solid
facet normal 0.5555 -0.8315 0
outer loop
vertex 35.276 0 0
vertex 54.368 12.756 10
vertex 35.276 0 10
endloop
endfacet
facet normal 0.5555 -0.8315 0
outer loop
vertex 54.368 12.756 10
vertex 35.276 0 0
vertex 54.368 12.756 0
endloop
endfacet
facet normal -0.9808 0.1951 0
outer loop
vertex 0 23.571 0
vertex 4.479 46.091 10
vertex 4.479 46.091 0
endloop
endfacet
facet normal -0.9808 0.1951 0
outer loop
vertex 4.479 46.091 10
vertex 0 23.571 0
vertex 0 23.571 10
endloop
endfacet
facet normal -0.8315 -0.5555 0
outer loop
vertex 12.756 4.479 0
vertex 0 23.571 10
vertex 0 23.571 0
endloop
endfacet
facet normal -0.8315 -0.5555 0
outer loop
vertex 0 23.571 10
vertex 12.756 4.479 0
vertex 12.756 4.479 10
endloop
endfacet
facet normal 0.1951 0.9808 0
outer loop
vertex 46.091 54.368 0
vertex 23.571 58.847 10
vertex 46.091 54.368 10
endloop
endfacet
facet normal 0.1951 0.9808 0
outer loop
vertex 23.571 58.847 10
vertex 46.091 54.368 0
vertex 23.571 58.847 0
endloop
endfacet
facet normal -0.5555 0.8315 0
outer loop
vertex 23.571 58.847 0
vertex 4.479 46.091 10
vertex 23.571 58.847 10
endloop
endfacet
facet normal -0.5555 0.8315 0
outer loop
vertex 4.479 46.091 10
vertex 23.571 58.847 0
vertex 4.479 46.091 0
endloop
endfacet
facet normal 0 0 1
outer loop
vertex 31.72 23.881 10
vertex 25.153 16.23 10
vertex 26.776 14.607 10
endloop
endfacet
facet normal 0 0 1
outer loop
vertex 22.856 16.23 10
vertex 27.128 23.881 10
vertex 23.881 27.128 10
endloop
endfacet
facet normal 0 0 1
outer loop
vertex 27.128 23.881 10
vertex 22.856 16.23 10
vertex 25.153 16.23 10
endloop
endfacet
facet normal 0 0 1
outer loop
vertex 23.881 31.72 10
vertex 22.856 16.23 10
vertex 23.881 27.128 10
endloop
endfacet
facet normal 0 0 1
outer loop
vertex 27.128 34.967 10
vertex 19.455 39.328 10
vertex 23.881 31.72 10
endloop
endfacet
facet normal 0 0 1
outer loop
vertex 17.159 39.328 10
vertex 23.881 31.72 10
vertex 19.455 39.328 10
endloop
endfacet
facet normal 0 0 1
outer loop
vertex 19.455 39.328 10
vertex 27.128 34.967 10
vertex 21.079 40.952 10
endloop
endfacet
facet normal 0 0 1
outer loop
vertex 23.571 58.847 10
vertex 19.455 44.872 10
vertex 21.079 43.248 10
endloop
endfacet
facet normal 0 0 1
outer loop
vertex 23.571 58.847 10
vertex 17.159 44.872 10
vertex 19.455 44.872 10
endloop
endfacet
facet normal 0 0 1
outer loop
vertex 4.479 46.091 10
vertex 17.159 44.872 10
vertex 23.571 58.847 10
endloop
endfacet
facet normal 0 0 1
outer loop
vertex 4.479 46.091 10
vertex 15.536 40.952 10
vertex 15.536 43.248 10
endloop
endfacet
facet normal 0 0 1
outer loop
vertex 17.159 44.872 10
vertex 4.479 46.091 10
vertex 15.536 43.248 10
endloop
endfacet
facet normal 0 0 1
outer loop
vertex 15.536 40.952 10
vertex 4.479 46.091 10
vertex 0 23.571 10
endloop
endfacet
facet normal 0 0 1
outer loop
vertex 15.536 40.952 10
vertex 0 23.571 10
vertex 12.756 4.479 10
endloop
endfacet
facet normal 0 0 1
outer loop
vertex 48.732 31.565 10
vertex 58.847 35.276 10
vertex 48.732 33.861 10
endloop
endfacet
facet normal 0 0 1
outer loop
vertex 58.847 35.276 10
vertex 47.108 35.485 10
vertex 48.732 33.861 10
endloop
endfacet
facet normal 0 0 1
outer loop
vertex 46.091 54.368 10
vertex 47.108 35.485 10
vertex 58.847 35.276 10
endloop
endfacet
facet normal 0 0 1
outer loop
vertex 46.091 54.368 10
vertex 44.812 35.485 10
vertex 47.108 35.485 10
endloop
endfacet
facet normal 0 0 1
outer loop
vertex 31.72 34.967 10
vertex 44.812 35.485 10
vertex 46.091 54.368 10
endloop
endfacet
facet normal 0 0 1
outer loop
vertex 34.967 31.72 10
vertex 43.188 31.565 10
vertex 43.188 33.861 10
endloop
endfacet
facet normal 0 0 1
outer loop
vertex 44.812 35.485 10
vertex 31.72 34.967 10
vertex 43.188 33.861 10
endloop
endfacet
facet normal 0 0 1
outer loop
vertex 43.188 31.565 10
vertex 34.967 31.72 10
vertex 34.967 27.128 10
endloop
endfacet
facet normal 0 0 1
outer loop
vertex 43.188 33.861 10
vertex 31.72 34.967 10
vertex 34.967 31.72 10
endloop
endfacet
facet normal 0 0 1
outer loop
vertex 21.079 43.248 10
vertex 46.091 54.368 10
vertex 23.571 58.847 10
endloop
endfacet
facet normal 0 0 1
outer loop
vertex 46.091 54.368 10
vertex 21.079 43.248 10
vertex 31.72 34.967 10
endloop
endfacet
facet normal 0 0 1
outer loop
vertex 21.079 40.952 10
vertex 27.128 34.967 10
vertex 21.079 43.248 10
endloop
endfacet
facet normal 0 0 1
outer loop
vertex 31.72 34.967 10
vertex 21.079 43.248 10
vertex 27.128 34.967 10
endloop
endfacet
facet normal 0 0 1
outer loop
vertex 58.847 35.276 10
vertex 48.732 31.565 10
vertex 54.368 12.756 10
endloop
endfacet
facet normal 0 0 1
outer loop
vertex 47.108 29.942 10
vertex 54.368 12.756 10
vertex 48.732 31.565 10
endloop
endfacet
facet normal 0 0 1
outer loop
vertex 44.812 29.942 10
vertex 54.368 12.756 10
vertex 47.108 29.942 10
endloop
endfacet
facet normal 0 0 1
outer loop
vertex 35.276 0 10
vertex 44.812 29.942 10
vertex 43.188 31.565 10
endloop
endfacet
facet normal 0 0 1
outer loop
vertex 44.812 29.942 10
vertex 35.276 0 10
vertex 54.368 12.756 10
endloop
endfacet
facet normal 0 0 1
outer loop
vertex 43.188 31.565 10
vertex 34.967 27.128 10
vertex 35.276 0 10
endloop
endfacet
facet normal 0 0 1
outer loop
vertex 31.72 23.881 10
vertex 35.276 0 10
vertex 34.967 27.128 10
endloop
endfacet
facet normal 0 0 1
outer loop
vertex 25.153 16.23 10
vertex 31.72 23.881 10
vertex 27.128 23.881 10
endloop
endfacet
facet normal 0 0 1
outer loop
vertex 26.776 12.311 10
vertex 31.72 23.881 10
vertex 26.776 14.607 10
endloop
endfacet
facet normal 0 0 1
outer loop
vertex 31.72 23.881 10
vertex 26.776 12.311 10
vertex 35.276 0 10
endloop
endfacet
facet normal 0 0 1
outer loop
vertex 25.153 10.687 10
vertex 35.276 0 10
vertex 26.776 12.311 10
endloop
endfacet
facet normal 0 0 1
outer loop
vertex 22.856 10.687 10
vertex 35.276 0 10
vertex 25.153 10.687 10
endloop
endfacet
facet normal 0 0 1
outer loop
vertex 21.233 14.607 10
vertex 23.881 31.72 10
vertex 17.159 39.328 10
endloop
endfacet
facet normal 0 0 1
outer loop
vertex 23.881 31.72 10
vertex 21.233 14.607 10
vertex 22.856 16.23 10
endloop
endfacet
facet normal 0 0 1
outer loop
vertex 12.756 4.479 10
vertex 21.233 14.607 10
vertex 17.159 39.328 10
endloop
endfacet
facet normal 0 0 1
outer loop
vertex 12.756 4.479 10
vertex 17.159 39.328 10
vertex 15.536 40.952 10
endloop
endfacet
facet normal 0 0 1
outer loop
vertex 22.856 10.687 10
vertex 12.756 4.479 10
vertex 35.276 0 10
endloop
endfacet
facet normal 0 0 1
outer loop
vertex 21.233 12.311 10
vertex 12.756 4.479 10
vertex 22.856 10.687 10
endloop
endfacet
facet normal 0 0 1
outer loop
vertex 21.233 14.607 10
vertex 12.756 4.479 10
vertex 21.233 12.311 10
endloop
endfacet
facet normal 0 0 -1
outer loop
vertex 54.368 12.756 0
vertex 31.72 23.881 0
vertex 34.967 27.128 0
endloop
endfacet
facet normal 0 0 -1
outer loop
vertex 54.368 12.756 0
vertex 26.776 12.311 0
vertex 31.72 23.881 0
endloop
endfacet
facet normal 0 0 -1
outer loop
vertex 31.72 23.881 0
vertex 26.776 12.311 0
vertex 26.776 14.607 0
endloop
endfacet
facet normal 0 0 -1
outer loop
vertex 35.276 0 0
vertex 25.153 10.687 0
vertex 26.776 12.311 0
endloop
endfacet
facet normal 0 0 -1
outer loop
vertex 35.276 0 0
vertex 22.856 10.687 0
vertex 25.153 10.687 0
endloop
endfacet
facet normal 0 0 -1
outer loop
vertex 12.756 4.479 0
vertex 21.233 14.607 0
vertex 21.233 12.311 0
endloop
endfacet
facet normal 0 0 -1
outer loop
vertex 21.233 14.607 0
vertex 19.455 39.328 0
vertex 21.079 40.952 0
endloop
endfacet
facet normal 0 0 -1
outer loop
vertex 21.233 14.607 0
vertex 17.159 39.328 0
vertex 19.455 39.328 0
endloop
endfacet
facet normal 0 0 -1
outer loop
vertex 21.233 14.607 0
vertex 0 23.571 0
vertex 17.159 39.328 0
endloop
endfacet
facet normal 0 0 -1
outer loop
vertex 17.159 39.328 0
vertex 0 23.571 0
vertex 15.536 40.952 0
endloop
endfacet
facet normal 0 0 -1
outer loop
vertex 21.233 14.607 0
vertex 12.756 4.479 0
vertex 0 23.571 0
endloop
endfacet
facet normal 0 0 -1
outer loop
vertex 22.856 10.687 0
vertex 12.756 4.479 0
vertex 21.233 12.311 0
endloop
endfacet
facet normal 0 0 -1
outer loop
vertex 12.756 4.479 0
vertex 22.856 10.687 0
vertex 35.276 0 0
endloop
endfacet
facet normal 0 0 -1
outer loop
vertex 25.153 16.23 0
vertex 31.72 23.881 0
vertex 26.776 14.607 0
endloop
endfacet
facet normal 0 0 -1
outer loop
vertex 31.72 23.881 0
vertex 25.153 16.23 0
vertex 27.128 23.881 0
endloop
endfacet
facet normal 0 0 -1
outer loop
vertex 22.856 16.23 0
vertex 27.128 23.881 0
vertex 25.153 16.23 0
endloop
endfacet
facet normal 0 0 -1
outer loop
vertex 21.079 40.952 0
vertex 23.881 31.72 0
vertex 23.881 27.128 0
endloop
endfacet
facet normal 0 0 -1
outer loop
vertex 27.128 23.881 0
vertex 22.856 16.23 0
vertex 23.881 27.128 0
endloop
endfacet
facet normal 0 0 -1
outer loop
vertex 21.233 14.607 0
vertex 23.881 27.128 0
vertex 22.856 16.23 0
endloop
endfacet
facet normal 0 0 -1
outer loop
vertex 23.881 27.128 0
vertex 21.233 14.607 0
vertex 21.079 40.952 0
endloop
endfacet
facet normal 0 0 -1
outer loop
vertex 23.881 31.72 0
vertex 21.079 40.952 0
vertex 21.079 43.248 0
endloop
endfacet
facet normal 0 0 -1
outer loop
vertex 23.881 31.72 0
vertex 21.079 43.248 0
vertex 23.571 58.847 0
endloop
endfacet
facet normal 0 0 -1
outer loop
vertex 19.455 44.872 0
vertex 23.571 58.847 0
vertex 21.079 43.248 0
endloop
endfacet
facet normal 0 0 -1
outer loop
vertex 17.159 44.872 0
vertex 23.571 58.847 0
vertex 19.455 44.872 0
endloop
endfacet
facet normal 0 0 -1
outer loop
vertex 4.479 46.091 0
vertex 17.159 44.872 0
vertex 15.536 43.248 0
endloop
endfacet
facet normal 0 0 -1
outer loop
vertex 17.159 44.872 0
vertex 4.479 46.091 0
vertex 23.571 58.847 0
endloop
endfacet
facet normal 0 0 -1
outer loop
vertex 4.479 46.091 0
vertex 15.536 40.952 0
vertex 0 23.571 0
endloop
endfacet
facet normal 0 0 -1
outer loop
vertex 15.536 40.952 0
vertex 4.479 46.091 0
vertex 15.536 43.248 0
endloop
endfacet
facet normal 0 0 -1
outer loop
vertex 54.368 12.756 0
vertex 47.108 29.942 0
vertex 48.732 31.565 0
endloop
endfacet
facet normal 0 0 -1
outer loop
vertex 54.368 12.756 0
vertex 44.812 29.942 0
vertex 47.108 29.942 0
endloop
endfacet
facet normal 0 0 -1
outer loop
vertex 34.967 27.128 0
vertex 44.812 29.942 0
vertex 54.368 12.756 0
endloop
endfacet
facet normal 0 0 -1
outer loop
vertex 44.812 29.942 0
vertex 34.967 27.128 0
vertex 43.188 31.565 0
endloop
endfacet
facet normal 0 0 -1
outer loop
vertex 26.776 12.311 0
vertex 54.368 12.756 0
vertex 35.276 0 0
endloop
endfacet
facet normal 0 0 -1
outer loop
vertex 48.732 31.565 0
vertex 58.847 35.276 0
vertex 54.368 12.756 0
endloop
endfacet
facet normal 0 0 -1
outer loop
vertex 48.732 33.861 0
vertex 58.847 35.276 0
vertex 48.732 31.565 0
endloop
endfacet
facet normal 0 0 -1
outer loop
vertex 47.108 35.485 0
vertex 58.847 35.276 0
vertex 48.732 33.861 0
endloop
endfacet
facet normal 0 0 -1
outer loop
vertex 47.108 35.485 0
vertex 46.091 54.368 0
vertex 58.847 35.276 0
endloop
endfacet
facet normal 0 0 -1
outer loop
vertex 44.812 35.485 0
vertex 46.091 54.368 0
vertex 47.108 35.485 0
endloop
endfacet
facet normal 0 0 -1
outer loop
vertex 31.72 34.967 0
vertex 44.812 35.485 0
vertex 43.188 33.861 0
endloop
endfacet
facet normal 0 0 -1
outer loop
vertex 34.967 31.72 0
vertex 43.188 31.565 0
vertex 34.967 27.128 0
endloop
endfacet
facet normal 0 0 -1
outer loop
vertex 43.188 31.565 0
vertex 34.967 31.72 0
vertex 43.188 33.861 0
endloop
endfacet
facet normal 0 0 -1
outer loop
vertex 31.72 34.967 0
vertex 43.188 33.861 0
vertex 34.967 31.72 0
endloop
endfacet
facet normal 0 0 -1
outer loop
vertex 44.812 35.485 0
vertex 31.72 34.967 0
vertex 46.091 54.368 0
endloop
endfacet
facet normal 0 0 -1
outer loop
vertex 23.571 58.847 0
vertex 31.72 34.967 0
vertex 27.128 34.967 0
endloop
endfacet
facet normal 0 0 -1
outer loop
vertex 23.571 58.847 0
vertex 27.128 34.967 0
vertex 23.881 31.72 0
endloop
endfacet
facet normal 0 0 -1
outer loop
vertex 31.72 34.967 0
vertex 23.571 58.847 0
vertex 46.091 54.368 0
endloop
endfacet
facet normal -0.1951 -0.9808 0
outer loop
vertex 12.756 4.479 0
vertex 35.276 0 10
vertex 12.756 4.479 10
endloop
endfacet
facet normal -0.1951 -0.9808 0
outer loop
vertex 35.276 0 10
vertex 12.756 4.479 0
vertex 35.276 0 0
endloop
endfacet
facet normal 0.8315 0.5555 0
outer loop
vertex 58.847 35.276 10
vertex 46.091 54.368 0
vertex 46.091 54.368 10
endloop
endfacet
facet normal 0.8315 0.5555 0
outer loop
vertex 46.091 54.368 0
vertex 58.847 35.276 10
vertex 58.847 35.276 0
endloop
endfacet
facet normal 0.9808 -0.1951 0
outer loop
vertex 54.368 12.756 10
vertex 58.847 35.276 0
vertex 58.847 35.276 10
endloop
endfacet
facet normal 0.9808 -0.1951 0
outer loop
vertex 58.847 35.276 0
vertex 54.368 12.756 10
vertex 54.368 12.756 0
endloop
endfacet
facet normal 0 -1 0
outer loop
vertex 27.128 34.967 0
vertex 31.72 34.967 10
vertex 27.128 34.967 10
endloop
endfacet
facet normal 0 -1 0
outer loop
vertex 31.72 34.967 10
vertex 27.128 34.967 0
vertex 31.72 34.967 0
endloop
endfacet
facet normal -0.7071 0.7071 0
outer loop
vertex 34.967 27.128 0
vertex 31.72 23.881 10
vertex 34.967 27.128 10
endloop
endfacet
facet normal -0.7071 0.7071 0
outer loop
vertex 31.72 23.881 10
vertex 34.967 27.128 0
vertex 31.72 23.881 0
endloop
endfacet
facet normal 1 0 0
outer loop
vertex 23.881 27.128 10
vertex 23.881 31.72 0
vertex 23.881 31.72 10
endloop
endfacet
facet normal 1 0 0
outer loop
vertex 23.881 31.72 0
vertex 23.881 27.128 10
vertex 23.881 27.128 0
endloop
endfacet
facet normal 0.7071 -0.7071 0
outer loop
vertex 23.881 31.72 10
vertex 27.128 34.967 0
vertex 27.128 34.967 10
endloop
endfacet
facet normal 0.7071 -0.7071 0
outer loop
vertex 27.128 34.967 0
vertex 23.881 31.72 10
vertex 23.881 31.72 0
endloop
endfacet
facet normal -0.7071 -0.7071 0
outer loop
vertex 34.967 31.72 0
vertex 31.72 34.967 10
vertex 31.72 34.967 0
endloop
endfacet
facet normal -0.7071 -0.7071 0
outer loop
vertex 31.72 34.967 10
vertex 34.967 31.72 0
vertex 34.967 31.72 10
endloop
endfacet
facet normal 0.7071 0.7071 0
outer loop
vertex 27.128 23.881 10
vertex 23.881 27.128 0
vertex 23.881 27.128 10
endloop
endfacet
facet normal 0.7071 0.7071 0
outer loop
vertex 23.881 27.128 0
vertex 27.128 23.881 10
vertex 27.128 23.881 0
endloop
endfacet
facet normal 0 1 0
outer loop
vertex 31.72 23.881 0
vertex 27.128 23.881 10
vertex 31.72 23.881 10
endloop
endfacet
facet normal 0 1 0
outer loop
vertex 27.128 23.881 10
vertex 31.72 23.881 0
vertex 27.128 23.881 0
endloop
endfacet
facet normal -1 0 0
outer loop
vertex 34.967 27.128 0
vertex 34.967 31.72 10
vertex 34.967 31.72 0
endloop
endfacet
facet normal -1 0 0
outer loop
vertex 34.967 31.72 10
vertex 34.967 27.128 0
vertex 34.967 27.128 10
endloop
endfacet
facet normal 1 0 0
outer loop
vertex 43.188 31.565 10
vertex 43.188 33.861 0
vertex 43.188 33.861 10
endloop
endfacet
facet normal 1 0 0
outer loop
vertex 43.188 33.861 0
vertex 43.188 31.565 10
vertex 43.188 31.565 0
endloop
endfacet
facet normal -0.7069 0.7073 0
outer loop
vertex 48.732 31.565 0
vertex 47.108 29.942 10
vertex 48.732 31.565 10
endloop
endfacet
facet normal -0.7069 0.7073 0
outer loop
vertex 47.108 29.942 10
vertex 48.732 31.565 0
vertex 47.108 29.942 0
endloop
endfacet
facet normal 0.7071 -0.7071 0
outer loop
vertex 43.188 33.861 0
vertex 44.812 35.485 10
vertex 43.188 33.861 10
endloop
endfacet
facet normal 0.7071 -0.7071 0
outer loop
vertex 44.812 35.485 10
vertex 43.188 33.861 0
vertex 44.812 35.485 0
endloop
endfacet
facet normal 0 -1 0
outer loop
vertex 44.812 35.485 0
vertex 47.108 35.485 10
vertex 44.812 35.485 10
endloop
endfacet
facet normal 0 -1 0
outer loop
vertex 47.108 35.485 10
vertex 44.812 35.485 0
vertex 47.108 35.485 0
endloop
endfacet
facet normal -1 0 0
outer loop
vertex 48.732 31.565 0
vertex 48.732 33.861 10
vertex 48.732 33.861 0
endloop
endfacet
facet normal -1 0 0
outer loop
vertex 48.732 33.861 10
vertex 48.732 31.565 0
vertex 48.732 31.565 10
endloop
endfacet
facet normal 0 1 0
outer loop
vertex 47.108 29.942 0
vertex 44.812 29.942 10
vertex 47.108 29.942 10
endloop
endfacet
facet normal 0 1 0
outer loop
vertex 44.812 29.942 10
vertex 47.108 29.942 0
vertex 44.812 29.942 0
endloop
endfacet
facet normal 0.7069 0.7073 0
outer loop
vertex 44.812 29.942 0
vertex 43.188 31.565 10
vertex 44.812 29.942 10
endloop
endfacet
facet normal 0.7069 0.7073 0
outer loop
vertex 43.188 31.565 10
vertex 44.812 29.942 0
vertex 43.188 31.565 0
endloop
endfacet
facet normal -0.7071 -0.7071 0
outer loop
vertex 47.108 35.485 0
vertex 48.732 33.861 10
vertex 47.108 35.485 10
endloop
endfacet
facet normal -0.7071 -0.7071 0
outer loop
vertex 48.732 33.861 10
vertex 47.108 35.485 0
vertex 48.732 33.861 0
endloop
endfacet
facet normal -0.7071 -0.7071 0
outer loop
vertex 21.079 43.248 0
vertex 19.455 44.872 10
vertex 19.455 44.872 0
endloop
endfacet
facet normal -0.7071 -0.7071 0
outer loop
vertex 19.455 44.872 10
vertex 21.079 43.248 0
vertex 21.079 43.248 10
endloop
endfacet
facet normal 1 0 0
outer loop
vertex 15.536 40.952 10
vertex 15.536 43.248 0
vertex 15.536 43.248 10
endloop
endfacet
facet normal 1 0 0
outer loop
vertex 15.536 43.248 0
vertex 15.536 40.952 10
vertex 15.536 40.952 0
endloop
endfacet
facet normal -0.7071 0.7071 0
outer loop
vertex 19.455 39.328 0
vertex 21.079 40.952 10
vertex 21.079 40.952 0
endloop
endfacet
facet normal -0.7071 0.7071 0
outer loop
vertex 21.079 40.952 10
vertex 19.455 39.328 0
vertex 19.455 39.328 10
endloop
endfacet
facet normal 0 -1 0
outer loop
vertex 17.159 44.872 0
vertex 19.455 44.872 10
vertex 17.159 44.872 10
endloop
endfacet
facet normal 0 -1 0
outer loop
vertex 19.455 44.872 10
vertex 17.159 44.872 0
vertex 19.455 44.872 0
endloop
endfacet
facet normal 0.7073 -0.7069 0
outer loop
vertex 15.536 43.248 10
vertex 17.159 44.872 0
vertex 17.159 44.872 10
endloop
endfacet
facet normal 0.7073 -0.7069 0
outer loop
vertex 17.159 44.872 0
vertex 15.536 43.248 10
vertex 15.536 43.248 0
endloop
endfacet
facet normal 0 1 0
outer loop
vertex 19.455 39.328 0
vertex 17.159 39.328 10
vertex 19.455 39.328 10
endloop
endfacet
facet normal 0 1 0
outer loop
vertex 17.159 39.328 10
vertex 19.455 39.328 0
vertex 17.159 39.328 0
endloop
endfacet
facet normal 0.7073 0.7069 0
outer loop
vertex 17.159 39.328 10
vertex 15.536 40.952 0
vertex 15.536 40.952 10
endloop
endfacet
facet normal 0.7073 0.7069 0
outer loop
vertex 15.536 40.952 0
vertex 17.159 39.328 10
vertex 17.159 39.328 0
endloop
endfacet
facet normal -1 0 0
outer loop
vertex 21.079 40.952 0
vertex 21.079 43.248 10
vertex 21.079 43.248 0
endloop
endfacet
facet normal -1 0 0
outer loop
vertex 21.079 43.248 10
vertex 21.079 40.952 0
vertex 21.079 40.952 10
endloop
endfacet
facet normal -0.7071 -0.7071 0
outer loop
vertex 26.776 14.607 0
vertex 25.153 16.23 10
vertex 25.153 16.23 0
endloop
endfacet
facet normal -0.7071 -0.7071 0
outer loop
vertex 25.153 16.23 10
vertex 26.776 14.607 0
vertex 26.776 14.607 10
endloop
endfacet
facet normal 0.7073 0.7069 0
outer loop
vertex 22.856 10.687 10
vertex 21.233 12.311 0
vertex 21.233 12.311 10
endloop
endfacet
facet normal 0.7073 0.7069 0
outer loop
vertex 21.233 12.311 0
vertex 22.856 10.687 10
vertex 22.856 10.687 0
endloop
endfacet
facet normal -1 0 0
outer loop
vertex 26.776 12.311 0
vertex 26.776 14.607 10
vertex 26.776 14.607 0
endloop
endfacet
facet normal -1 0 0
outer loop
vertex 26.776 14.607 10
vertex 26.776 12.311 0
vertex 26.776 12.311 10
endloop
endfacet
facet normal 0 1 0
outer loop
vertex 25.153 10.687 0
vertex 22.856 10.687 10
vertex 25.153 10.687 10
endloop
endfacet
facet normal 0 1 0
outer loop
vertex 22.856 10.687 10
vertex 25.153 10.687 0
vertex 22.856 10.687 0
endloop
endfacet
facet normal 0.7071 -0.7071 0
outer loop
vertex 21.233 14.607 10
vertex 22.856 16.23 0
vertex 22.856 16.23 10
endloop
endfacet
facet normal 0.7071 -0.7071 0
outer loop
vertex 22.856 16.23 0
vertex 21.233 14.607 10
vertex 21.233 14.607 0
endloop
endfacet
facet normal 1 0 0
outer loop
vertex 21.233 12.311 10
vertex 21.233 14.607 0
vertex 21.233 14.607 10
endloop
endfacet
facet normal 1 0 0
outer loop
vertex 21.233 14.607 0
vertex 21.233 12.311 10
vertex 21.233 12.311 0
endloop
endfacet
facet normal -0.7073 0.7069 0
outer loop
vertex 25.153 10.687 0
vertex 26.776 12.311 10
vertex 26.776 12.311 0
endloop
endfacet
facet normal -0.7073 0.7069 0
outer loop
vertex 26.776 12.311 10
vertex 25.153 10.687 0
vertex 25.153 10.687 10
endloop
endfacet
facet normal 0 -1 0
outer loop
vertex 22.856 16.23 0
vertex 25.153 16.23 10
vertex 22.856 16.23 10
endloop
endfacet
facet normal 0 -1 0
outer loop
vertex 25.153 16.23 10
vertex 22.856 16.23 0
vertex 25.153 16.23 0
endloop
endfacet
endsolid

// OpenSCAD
$fn = 32;

// ----------------------------------------------------------------------
// Polygon plate: 8-gon R30, 3 bolt windows
// ----------------------------------------------------------------------

// --- parameters (mm) ---
sides = 8;                // number of polygon sides
plate_r = 30;             // circumscribed radius of the polygon
bore_r = 6;               // centre bore radius
bolts = 3;                // number of bolt windows
ring_r = 16.86;           // bolt-circle radius
bolt_r = 3;               // bolt window radius
plate_t = 10;             // plate thickness, Z (extrusion height)
fit_tol = 0.05;           // declared fit tolerance (prompt contract)
free_tol = 0.2;           // declared free tolerance (prompt contract)

plate_d = 2 * plate_r;  // circumscribed diameter
bore_d = 2 * bore_r;  // centre bore diameter
bolt_d = 2 * bolt_r;  // bolt window diameter
ring_d = 2 * ring_r;  // bolt-circle diameter

profile = [[58.847, 35.276], [46.091, 54.368], [23.571, 58.847], [4.479, 46.091], [0, 23.571], [12.756, 4.479], [35.276, 0], [54.368, 12.756]];  // primary outline, 8 points, counter clockwise
void_1 = [[34.967, 31.72], [31.72, 34.967], [27.128, 34.967], [23.881, 31.72], [23.881, 27.128], [27.128, 23.881], [31.72, 23.881], [34.967, 27.128]];  // centre bore, 8 points
void_2 = [[48.732, 33.861], [47.108, 35.485], [44.812, 35.485], [43.188, 33.861], [43.188, 31.565], [44.812, 29.942], [47.108, 29.942], [48.732, 31.565]];  // bolt window 1, 8 points
void_3 = [[21.079, 43.248], [19.455, 44.872], [17.159, 44.872], [15.536, 43.248], [15.536, 40.952], [17.159, 39.328], [19.455, 39.328], [21.079, 40.952]];  // bolt window 2, 8 points
void_4 = [[26.776, 14.607], [25.153, 16.23], [22.856, 16.23], [21.233, 14.607], [21.233, 12.311], [22.856, 10.687], [25.153, 10.687], [26.776, 12.311]];  // bolt window 3, 8 points

// --- the one profile operation ---
difference() {
  linear_extrude(height = plate_t) polygon(points = profile);
  translate([0, 0, -1])
    linear_extrude(height = plate_t + 2) polygon(points = void_1);
  translate([0, 0, -1])
    linear_extrude(height = plate_t + 2) polygon(points = void_2);
  translate([0, 0, -1])
    linear_extrude(height = plate_t + 2) polygon(points = void_3);
  translate([0, 0, -1])
    linear_extrude(height = plate_t + 2) polygon(points = void_4);
}
